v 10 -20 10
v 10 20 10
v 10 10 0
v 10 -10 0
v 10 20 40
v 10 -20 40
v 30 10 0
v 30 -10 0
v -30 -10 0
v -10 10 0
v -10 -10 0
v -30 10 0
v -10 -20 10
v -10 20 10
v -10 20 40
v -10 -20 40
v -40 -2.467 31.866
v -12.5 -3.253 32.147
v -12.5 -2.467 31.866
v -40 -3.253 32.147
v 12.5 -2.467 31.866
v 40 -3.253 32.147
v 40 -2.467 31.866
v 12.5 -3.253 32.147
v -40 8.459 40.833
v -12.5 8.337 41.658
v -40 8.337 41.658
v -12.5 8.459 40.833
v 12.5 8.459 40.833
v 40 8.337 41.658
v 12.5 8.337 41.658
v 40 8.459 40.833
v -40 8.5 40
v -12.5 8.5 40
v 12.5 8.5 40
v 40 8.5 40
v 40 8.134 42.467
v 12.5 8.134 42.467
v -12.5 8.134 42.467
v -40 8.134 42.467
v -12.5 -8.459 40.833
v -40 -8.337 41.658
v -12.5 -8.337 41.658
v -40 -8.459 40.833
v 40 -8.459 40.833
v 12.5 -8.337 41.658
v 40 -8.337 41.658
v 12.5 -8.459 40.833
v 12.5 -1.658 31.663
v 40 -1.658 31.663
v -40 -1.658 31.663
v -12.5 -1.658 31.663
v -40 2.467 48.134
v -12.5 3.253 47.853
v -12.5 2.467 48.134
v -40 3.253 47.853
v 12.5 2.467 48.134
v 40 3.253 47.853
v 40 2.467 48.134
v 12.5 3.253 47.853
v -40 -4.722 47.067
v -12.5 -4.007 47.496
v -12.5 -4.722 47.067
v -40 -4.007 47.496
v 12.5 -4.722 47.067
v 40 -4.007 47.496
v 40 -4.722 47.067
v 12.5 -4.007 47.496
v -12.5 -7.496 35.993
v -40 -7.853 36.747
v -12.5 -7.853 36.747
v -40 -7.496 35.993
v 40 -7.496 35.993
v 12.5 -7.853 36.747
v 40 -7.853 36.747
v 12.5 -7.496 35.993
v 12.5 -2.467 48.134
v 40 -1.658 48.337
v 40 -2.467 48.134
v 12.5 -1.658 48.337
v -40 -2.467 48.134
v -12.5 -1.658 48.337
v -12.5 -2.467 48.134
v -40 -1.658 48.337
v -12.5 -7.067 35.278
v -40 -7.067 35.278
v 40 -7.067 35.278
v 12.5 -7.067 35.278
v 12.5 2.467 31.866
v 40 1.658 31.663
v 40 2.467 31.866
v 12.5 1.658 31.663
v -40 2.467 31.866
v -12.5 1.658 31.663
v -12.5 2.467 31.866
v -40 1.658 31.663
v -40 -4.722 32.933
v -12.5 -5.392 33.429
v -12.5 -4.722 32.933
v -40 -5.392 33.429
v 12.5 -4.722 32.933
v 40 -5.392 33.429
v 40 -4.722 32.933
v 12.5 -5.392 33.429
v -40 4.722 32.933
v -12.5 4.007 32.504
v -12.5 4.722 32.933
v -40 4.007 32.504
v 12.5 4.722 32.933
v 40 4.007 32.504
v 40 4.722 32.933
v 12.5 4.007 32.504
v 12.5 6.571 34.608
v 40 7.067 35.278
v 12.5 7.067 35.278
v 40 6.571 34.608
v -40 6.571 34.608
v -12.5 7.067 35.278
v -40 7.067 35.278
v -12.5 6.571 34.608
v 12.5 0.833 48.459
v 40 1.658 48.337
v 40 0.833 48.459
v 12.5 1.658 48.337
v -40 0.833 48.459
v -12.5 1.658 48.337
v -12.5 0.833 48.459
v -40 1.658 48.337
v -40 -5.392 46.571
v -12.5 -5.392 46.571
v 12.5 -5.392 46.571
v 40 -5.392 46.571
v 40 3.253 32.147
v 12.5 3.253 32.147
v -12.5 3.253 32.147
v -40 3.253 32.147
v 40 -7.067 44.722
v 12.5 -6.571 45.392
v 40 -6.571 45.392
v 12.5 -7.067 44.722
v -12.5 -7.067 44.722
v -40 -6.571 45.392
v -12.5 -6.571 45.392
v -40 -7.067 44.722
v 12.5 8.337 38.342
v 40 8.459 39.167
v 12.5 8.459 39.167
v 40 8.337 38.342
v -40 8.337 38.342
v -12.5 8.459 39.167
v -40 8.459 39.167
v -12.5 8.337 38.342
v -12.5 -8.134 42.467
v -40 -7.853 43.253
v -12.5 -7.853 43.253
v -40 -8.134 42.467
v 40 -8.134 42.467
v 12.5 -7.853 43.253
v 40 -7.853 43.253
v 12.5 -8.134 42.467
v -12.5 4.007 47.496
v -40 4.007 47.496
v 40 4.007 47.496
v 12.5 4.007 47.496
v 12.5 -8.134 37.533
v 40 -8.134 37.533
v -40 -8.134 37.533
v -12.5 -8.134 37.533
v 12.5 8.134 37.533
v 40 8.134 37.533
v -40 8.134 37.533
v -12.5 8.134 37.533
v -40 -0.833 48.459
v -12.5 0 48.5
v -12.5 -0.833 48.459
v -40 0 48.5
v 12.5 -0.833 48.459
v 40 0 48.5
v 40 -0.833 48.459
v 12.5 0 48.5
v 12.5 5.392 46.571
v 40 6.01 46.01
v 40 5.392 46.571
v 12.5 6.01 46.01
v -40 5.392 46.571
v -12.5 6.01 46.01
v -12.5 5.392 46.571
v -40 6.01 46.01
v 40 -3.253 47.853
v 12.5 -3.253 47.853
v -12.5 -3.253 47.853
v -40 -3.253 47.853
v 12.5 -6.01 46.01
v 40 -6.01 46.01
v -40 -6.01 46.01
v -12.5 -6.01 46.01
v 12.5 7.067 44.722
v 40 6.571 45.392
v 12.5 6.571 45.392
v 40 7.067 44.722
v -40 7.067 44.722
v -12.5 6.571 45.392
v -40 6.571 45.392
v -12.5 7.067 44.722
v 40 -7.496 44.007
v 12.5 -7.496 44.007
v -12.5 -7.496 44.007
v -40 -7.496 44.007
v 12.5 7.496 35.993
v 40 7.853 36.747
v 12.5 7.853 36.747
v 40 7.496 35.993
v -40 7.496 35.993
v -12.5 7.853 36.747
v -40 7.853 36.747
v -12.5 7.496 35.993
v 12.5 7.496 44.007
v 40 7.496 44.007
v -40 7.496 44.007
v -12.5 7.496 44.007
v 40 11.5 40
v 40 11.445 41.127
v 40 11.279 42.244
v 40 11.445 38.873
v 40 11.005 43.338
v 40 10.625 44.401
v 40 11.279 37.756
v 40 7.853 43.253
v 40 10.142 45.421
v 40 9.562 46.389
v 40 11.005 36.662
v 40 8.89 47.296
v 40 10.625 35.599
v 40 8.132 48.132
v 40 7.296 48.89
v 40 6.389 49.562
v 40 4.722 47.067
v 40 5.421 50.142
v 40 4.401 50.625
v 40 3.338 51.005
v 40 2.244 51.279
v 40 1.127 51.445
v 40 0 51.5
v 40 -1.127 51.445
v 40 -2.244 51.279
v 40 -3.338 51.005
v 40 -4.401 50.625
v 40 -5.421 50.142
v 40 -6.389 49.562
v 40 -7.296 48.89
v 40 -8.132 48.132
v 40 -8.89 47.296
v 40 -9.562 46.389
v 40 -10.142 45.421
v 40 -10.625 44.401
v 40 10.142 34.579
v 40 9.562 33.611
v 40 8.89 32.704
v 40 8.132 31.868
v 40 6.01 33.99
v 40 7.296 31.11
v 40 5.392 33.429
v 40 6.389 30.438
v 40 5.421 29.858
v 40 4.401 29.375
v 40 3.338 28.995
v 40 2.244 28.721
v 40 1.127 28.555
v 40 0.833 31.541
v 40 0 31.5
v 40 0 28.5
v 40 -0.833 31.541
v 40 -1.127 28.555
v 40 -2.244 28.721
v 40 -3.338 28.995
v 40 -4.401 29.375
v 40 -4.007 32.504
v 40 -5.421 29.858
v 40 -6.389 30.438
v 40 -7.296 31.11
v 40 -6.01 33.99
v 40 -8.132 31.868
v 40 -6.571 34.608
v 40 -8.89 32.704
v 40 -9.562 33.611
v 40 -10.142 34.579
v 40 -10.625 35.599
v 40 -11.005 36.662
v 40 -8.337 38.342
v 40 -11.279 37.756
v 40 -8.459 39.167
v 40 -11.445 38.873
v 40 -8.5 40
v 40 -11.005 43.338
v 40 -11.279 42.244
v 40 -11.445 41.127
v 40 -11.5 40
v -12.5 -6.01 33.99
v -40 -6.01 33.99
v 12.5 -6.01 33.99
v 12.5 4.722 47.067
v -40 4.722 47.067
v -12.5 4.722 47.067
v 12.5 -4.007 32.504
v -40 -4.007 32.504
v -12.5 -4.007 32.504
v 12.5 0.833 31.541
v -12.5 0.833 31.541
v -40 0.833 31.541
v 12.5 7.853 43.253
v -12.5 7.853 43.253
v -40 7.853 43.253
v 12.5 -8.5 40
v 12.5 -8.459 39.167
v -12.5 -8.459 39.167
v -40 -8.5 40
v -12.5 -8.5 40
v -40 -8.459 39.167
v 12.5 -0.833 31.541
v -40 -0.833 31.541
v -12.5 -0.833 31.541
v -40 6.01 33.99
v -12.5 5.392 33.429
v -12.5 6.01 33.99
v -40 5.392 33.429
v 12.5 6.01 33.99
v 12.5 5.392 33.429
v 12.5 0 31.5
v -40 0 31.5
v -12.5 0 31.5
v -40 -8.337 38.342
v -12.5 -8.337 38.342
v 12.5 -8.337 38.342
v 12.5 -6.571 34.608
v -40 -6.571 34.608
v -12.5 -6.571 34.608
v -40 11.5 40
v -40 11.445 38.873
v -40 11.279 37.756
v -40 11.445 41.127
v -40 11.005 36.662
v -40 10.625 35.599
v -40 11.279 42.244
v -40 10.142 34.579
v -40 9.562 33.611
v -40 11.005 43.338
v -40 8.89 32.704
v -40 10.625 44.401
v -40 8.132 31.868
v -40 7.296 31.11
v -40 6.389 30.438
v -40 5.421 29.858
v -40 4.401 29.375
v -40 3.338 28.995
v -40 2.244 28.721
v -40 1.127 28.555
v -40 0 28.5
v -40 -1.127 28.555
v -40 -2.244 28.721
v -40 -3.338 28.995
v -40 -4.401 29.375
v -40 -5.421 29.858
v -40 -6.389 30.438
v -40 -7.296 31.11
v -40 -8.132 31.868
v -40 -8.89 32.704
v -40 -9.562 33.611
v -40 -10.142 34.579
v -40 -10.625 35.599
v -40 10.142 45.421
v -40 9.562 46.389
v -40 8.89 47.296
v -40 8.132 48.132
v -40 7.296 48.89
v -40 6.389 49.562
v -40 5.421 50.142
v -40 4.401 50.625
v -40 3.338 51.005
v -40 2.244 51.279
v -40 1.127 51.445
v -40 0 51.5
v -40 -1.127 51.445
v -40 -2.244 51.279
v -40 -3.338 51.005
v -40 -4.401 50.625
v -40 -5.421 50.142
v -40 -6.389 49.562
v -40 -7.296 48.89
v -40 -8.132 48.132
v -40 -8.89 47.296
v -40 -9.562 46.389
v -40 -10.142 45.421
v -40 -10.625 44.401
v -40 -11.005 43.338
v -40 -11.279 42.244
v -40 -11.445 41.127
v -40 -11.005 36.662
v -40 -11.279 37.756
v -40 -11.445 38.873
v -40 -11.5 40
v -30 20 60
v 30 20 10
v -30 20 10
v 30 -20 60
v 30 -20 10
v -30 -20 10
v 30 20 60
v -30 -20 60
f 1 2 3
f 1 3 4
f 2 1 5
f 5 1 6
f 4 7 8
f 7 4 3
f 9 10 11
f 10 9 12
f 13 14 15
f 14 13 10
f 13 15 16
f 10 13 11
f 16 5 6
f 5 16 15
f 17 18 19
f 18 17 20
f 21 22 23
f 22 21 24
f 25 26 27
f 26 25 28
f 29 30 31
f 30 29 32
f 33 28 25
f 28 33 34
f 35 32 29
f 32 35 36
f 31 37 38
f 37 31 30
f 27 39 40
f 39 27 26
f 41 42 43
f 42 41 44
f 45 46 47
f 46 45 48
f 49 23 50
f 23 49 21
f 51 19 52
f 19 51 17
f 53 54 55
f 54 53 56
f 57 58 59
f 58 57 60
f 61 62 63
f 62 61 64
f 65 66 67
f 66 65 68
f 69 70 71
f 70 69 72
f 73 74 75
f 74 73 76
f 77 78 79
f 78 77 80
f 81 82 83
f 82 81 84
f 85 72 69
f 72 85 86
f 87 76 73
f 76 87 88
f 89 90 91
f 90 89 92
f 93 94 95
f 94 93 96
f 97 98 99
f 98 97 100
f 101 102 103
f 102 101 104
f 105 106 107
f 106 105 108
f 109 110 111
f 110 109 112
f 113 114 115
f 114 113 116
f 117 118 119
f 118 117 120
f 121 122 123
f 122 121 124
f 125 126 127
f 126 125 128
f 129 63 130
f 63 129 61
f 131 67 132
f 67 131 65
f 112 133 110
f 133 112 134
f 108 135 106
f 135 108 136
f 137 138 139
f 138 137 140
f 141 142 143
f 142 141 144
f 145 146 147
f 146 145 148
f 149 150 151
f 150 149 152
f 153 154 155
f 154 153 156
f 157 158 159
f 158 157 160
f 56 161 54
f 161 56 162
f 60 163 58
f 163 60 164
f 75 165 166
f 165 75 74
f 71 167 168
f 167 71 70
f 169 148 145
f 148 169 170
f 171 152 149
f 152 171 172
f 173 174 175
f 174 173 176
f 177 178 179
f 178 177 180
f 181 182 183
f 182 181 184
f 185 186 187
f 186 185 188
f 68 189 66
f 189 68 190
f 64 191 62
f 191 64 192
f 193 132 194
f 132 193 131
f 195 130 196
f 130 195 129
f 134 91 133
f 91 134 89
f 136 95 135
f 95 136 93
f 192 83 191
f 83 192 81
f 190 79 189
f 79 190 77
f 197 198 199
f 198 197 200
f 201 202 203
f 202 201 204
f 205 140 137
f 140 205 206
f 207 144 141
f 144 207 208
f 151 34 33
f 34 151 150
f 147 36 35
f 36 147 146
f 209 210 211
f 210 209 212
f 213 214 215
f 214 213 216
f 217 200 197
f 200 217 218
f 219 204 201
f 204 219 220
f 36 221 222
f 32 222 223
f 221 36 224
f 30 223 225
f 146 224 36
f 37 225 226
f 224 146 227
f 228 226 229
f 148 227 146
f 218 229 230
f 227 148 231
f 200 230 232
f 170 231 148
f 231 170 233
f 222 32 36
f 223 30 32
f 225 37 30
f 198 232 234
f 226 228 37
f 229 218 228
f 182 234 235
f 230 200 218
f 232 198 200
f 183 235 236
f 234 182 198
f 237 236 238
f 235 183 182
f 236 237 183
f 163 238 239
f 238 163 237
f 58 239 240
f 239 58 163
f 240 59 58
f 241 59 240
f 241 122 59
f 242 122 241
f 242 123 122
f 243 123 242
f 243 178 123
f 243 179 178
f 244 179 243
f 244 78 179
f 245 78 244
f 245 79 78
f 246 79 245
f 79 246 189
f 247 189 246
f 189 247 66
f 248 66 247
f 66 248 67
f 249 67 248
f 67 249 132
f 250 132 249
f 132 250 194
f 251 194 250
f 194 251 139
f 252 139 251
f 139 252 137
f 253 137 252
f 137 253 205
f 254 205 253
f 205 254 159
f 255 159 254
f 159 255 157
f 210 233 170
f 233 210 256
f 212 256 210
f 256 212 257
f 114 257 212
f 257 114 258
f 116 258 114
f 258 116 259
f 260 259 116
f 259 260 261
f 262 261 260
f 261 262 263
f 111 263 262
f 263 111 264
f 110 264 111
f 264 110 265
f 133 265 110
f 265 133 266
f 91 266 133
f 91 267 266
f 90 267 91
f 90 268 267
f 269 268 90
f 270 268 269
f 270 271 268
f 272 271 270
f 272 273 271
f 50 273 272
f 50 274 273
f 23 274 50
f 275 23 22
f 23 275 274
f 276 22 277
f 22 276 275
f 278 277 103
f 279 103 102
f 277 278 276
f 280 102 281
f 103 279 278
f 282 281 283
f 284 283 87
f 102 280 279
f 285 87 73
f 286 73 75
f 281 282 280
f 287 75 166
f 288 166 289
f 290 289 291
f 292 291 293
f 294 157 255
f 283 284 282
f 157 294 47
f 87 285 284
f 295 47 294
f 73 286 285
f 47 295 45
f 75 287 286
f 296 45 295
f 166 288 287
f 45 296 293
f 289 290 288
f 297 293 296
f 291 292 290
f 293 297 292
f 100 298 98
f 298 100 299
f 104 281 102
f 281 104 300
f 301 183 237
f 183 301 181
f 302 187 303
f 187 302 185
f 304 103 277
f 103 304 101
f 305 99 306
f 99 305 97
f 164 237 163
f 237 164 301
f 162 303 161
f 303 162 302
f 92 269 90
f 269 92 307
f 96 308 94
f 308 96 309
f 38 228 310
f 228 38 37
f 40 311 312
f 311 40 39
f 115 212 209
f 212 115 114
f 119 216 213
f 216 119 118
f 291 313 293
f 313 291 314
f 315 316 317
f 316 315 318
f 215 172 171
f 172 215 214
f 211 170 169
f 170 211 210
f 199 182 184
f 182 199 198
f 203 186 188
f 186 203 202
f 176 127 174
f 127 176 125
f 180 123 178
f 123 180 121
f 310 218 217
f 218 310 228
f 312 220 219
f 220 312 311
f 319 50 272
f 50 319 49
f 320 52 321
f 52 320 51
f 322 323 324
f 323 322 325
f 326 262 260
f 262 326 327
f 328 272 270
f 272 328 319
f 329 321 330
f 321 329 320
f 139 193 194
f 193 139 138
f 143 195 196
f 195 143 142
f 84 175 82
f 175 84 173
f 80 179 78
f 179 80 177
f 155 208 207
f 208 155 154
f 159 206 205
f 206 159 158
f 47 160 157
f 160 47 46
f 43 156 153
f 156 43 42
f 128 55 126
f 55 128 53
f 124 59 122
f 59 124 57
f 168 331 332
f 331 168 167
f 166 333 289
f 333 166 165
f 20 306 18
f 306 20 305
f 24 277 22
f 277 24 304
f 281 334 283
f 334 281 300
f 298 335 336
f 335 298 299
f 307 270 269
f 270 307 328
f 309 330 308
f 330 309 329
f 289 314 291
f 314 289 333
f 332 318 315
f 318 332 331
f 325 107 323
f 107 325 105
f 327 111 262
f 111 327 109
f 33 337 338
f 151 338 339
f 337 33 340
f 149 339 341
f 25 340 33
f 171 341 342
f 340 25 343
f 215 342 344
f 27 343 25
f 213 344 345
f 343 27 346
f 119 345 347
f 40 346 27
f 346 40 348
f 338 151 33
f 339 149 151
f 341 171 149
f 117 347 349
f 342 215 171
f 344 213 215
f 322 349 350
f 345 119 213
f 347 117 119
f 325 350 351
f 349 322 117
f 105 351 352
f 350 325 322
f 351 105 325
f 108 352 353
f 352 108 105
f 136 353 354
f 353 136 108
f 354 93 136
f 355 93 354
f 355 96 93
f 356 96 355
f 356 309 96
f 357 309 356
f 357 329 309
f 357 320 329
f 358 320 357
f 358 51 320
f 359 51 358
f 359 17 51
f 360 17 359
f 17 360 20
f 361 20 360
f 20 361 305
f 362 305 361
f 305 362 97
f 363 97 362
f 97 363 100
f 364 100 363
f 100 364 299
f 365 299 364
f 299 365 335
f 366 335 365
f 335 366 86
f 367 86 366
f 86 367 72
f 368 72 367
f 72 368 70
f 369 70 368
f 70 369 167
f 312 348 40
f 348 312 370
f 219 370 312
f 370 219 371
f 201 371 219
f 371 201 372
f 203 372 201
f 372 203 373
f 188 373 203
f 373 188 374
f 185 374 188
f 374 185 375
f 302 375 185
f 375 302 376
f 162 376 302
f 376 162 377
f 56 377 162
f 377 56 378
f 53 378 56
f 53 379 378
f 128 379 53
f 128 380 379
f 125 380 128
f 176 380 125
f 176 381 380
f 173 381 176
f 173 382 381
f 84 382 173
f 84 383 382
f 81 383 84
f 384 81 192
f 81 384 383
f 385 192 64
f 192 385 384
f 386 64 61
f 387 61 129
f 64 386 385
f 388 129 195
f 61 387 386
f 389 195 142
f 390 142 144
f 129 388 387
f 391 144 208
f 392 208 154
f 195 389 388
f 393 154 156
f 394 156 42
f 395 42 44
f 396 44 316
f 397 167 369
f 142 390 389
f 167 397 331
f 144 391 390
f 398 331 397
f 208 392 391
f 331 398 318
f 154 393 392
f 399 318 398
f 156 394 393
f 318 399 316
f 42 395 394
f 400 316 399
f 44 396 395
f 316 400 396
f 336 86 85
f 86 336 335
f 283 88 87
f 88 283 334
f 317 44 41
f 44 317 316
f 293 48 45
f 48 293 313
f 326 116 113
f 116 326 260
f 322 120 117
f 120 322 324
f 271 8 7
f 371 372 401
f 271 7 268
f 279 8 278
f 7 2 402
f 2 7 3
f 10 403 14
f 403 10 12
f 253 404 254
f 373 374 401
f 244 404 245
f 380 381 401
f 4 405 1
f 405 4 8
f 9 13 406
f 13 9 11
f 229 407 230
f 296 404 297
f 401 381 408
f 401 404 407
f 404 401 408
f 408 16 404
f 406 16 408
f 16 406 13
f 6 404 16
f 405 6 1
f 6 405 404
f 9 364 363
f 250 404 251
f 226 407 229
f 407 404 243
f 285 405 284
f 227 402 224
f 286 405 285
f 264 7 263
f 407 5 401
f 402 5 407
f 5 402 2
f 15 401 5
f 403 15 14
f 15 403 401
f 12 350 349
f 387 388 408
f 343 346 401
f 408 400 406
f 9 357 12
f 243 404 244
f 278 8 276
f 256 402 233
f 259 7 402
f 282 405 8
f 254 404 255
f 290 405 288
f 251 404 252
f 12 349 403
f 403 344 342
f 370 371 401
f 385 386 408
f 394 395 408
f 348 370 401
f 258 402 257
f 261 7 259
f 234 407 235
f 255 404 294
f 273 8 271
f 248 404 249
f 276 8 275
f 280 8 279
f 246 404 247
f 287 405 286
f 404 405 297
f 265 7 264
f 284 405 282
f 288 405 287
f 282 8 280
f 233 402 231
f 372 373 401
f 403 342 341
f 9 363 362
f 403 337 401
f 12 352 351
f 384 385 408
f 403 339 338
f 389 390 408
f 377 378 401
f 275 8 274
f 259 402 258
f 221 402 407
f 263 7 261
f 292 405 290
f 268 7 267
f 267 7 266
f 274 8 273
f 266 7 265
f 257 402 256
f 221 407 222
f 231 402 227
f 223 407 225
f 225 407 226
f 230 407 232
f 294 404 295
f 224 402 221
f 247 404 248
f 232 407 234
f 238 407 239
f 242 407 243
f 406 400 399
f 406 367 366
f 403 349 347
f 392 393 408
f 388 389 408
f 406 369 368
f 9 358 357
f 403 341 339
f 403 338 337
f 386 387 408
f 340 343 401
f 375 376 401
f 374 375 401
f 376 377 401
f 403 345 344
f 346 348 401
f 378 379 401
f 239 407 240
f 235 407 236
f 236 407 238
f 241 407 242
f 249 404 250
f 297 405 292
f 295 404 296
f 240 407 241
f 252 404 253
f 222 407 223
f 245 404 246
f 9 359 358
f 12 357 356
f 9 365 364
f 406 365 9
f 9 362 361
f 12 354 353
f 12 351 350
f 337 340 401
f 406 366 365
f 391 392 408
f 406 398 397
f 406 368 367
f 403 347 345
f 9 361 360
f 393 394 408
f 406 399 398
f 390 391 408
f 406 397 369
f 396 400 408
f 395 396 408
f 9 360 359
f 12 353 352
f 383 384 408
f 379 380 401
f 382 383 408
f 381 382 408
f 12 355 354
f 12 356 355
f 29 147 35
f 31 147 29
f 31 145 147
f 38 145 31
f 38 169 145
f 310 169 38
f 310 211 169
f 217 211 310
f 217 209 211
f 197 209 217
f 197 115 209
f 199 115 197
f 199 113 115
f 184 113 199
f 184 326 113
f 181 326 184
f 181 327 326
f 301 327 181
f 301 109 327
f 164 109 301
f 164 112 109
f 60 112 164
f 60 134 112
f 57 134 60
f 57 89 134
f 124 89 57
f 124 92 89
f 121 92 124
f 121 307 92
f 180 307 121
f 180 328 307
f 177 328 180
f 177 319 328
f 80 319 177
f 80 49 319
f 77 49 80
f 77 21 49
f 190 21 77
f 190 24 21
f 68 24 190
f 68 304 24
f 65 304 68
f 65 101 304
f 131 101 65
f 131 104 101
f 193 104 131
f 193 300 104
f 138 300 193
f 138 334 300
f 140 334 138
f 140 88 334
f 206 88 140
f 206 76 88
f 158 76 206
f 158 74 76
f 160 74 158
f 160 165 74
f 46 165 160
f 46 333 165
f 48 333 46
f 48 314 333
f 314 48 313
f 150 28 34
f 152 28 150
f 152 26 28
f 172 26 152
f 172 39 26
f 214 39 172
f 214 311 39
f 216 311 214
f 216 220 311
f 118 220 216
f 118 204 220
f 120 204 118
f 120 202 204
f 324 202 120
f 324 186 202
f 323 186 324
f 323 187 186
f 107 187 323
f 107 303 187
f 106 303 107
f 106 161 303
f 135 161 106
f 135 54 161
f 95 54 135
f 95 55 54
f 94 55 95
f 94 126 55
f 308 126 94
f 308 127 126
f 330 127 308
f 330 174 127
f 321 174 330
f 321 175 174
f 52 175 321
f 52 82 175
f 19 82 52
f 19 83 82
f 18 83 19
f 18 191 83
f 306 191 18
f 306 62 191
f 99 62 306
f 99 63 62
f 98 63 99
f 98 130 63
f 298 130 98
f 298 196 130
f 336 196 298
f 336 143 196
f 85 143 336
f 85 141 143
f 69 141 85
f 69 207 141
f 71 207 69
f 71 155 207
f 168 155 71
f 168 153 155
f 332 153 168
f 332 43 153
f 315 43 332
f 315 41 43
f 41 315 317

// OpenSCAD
$BRICK_SIZE = 20;

$TUBE_DIAMETER = 17;
$WIDTH_OUT_TUBE = $BRICK_SIZE-$TUBE_DIAMETER;
$fn=64;

module brick(x,y,z) {
    translate([x*$BRICK_SIZE,y*$BRICK_SIZE,z*$BRICK_SIZE]) {
        cube($BRICK_SIZE);
    }   
}

module cover_brick(x,y,z) {
    translate([x*$BRICK_SIZE,y*$BRICK_SIZE,z*$BRICK_SIZE]) {
        cube($BRICK_SIZE+3);
    }   
}

module intube(height) {
        cylinder(r=$TUBE_DIAMETER/2, h=height);
}

module outtube(height) {
        cylinder(r=$TUBE_DIAMETER/2+$WIDTH_OUT_TUBE, h=height);
}


module underbar() {
    brick(-0.5,-0.5,0);
    brick(-0.5,-0.5,1);
    
    brick(-0.5,-1.5,0);
    brick(-0.5,-1.5,1);
    
    brick(-0.5,0.5,0);
    brick(-0.5,0.5,1);
}

module b1() {
    difference() {
        union() {
            brick(0.5,-0.5,0);
            brick(0.5,-0.5,1);
            brick(0.5,-0.5,1.5);

            brick(-0.5,-0.5,2);

            brick(-1.5,-0.5,0);
            brick(-1.5,-0.5,1);
            brick(-1.5,-0.5,2);
        }
        

    }
}   

module b2() {
    difference() {
        union() {
            brick(0.5,-1,0.5);
            brick(0.5,-1,1);
            brick(0.5,-1,2);

            brick(-0.5,-1,2);

            brick(-1.5,-1,0.5);
            brick(-1.5,-1,1);
            brick(-1.5,-1,2);
        }

    }
}   


module b3() {
    difference() {
        union() {
            brick(0.5,0,0.5);
            brick(0.5,0,1);
            brick(0.5,0,2);

            brick(-0.5,0,2);

            brick(-1.5,0,0.5);
            brick(-1.5,0,1);
            brick(-1.5,0,2);
        }
        

    }
}   


module holder(rotation) {
  translate([-$BRICK_SIZE*2, 0, $BRICK_SIZE*2]) {
        rotate(rotation){
                outtube(80);
        }
    }
}


module holderin(rotation) {
  translate([-$BRICK_SIZE*2, 0, $BRICK_SIZE*2]) {
        rotate(rotation){
                intube(80);
        }
    }
}




difference() {
    hull() {
        b1();
        b2();
        b3();
        holder([90,0,90]);
    }
    
    union(){
        holderin([90,0,90]);
        underbar();
    }
}

// pared interior para que no escape la barra
difference() {
scale([1.25,1,1]) brick(-0.5,-0.5,1.5);
brick(-0.5,-0.5,1);
}
